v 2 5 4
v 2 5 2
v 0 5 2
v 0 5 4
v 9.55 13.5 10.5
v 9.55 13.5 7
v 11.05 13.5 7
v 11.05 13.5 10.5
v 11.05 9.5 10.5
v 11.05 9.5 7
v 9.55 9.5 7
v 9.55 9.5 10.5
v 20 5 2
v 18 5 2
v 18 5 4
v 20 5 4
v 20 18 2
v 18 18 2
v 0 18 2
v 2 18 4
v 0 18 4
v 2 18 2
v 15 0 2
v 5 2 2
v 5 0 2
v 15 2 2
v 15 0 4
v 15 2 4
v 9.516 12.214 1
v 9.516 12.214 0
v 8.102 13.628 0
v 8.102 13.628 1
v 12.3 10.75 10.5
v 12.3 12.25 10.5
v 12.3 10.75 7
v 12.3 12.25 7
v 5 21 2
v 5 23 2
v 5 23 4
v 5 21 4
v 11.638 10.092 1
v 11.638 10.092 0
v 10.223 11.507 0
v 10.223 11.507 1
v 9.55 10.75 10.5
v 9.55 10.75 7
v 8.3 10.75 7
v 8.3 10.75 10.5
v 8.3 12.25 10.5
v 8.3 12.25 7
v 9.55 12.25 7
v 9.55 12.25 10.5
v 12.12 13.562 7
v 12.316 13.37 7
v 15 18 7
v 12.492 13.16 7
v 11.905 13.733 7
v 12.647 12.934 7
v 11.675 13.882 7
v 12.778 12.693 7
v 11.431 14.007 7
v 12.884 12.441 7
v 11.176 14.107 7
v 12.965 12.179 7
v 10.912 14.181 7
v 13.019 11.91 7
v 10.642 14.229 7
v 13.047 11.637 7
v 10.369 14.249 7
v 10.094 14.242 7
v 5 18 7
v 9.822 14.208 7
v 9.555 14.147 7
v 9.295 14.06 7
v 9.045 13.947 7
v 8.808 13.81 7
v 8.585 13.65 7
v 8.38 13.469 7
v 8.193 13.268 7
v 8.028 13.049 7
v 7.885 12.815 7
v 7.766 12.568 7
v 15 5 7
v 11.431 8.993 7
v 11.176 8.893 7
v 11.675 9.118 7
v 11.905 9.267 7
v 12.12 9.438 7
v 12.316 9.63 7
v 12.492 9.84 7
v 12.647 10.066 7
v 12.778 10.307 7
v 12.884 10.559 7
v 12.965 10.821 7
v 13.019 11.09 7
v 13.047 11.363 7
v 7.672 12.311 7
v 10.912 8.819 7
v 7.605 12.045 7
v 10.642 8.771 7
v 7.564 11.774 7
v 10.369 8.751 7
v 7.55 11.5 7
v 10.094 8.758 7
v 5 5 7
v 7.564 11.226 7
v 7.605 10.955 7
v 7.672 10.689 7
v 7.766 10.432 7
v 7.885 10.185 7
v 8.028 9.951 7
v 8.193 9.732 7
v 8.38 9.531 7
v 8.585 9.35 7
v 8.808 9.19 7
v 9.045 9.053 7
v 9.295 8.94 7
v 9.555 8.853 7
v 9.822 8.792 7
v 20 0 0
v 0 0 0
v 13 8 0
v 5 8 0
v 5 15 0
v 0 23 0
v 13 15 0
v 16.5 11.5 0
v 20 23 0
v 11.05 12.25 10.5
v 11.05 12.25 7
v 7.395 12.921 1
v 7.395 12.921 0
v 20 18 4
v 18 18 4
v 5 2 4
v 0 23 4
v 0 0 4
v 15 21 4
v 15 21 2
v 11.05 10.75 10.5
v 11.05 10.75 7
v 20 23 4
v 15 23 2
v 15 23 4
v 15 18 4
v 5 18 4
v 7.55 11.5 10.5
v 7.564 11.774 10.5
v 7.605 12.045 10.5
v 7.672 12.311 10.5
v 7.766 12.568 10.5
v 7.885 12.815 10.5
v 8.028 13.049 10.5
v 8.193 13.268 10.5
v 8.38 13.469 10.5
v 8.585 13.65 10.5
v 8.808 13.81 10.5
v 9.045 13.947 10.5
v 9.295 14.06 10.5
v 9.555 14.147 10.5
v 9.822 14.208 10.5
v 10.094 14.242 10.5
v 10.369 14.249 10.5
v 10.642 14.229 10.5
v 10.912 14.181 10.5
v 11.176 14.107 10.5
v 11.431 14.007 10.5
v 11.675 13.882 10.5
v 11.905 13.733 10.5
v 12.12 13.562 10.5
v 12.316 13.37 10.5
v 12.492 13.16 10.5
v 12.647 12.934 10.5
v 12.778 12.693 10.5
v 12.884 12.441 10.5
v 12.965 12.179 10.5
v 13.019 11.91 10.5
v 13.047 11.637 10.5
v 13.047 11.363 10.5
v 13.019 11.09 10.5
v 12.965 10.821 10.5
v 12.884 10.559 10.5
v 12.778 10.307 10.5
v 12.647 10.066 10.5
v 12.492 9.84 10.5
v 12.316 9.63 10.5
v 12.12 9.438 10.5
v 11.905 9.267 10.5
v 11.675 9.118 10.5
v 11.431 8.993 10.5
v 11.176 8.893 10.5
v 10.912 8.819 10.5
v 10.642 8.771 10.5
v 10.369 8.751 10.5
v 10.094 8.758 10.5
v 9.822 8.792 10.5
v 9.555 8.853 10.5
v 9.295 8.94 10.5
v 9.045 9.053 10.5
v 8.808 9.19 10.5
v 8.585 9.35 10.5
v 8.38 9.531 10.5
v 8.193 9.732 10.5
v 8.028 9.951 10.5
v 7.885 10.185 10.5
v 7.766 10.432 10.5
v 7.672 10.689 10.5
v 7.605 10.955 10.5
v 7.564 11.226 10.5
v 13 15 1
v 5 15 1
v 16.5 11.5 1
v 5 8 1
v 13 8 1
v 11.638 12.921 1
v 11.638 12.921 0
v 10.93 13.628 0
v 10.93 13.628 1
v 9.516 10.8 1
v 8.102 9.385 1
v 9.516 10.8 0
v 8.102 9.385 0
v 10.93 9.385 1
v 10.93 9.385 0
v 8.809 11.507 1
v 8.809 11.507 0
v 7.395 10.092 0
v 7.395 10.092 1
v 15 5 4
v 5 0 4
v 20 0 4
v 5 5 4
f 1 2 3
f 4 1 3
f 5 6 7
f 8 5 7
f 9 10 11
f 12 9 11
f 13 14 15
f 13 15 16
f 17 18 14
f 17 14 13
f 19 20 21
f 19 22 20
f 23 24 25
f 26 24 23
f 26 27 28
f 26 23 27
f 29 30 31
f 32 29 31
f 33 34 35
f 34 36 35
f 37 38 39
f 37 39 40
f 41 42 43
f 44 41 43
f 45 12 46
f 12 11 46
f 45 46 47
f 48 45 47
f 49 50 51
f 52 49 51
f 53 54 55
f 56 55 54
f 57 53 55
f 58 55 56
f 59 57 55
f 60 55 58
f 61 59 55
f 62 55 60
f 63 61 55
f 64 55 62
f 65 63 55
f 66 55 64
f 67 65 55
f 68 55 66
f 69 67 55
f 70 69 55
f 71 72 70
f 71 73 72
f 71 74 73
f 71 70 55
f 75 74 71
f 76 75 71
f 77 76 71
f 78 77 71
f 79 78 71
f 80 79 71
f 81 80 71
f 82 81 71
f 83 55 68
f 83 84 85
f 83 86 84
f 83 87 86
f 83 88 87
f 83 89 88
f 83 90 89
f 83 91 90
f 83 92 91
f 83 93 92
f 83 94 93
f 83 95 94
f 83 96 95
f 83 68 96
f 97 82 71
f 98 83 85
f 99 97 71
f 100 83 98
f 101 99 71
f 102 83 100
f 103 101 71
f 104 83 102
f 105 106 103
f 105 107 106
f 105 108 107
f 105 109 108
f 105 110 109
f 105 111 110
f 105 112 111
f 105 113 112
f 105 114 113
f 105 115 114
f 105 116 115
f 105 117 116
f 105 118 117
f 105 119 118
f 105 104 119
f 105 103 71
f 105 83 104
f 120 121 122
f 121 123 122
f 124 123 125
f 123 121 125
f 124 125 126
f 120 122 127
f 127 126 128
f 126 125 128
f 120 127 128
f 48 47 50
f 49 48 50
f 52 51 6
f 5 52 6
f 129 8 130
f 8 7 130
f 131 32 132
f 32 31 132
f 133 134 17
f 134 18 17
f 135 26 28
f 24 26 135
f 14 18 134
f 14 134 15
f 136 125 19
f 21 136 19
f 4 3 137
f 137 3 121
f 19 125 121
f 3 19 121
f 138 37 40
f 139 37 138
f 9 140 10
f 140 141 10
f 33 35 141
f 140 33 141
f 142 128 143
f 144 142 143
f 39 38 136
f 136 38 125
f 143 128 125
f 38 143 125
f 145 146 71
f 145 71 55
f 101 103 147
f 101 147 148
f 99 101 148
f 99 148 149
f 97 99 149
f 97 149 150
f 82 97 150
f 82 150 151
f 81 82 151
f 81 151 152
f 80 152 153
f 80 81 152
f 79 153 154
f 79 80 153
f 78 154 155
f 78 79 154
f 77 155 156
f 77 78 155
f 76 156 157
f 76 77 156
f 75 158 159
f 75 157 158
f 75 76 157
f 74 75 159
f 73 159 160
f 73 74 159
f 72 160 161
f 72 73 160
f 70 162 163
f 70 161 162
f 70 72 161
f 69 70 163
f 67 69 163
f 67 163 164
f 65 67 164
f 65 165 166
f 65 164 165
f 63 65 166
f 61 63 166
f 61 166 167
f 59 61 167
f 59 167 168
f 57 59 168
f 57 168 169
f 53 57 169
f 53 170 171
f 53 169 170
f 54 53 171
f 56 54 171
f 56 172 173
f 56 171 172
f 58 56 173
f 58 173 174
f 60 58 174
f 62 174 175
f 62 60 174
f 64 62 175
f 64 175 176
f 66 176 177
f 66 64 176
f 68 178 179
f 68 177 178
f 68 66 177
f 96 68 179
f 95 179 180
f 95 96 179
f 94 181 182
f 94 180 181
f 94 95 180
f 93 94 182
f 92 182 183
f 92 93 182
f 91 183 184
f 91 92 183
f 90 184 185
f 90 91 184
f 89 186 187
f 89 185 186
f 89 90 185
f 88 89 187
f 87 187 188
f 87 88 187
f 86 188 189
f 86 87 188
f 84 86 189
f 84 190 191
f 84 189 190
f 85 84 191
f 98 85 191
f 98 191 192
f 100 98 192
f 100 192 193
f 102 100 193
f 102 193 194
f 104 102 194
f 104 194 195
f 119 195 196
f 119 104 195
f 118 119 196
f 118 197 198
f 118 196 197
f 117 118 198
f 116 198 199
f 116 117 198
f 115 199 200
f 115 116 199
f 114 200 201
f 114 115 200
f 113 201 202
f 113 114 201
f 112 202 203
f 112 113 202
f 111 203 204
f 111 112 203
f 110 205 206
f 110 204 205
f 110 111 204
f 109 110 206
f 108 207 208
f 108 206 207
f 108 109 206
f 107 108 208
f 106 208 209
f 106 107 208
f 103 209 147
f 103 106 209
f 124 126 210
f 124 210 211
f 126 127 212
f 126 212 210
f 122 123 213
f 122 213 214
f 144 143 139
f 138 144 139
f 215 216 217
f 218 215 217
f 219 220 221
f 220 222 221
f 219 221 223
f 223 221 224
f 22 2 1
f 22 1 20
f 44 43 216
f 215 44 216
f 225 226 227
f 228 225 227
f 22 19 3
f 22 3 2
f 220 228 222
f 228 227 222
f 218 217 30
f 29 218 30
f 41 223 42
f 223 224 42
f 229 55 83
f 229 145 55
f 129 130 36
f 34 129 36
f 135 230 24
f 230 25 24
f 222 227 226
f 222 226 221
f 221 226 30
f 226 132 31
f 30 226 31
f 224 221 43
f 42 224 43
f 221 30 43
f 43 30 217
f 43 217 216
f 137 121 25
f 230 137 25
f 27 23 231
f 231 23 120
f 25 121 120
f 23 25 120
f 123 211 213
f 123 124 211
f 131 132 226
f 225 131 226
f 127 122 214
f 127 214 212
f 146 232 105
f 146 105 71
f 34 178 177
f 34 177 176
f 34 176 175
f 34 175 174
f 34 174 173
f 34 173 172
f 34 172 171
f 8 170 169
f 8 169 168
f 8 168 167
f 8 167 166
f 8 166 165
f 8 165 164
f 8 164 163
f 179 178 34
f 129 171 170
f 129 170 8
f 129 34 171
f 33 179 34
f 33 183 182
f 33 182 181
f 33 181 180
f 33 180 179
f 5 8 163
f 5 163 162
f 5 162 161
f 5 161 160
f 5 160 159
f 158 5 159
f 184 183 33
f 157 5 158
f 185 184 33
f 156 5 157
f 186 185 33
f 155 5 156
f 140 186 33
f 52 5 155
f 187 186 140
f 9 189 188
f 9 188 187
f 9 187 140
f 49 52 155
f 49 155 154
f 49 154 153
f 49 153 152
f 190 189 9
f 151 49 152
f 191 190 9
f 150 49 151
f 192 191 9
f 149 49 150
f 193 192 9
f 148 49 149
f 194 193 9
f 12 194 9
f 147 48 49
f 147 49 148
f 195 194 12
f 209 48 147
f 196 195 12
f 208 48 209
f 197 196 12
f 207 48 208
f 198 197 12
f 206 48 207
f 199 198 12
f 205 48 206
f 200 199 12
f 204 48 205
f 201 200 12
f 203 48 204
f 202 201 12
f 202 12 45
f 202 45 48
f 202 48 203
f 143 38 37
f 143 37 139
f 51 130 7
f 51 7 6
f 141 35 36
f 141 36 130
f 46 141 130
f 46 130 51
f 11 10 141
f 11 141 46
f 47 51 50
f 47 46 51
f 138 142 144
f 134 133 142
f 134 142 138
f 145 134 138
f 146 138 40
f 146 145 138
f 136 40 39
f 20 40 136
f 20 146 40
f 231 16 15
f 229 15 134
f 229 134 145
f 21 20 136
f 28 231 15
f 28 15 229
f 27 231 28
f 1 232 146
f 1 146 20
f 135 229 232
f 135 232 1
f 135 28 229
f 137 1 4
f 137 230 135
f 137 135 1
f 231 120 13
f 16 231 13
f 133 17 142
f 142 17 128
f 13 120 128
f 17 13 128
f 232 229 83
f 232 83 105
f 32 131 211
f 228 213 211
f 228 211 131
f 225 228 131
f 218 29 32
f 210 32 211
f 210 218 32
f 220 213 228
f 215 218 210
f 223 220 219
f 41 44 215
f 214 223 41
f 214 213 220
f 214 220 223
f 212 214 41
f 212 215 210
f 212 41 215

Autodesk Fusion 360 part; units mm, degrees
sketch "スケッチ1" plane through (0, 0, 0) normal (0, 0, 1) x (1, 0, 0)
  line L0 (0, 0) -> (20, 0)
  line L1 (20, 0) -> (20, 23)
  line L2 (20, 23) -> (0, 23)
  line L3 (0, 23) -> (0, 0)
  dimension "d1" = 20
  dimension "d2" = 23
extrude "押し出し1" add sketch "スケッチ1" along normal blind 2
sketch "スケッチ2" plane through (0, 0, 2) normal (0, 0, 1) x (-1, 0, 0)
  line L0 (0, -23) -> (0, 0)
  line L1 (0, 0) -> (-20, 0)
  line L2 (-20, 0) -> (-20, -23)
  line L3 (-20, -23) -> (0, -23)
  line L4 (0, -23) -> (-5, -23)
  line L5 (-5, -23) -> (-5, -18)
  line L6 (-5, -18) -> (0, -18)
  line L7 (0, -18) -> (0, -23)
  line L8 (-20, -23) -> (-15, -23)
  line L9 (-15, -23) -> (-15, -18)
  line L10 (-15, -18) -> (-20, -18)
  line L11 (-20, -18) -> (-20, -23)
  line L12 (0, 0) -> (-5, 0)
  line L13 (-5, 0) -> (-5, -5)
  line L14 (-5, -5) -> (0, -5)
  line L15 (0, -5) -> (0, 0)
  line L16 (-20, 0) -> (-15, 0)
  line L17 (-15, 0) -> (-15, -5)
  line L18 (-15, -5) -> (-20, -5)
  line L19 (-20, -5) -> (-20, 0)
  line L20 (-2, -21) -> (-18, -21)
  line L21 (-18, -21) -> (-18, -2)
  line L22 (-18, -2) -> (-2, -2)
  line L23 (-2, -2) -> (-2, -21)
  dimension "d5" = 5
  dimension "d6" = 5
  dimension "d7" = 5
  dimension "d8" = 5
  dimension "d9" = 5
  dimension "d10" = 5
  dimension "d11" = 5
  dimension "d12" = 5
extrude "押し出し2" add sketch "スケッチ2" along normal blind 2 contours L0 L3 L4 L5 L6 L7 L20 L23 | L0 L1 L12 L13 L14 L15 L22 L23 | L5 L6 L20 L23 | L5 L6 L9 L10 L13 L14 L17 L18 L20 L21 L22 L23 | L2 L3 L8 L9 L10 L11 L20 L21 | L13 L14 L22 L23 | L9 L10 L20 L21 | L1 L2 L16 L17 L18 L19 L21 L22 | L17 L18 L21 L22
sketch "スケッチ3" plane through (0, 0, 4) normal (0, 0, 1) x (-1, 0, 0)
  line L0 (-18, -18) -> (-20, -18)
  line L1 (-20, -18) -> (-20, -23)
  line L2 (-20, -23) -> (-15, -23)
  line L3 (-15, -23) -> (-15, -21)
  line L4 (-15, -21) -> (-5, -21)
  line L5 (-5, -21) -> (-5, -23)
  line L6 (-5, -23) -> (0, -23)
  line L7 (0, -23) -> (0, -18)
  line L8 (0, -18) -> (-2, -18)
  line L9 (-2, -18) -> (-2, -5)
  line L10 (-2, -5) -> (0, -5)
  line L11 (0, -5) -> (0, 0)
  line L12 (0, 0) -> (-5, 0)
  line L13 (-5, 0) -> (-5, -2)
  line L14 (-5, -2) -> (-15, -2)
  line L15 (-15, -2) -> (-15, 0)
  line L16 (-15, 0) -> (-20, 0)
  line L17 (-20, 0) -> (-20, -5)
  line L18 (-20, -5) -> (-18, -5)
  line L19 (-18, -5) -> (-18, -18)
  line L20 (-5, -18) -> (-15, -18)
  line L21 (-15, -18) -> (-15, -5)
  line L22 (-15, -5) -> (-5, -5)
  line L23 (-5, -5) -> (-5, -18)
extrude "押し出し3" add sketch "スケッチ3" along normal blind 3 contours L20 L21 L22 L23
sketch "スケッチ4" plane through (0, 0, 7) normal (0, 0, 1) x (-1, 0, 0)
  line L0 (-5, -5) -> (-15, -5)
  line L1 (-15, -5) -> (-15, -18)
  line L2 (-15, -18) -> (-5, -18)
  line L3 (-5, -18) -> (-5, -5)
  line L4 (-9.55, -13.5) -> (-11.05, -13.5)
  line L5 (-11.05, -13.5) -> (-11.05, -9.5)
  line L6 (-11.05, -9.5) -> (-9.55, -9.5)
  line L7 (-9.55, -9.5) -> (-9.55, -13.5)
  line L8 (-8.3, -12.25) -> (-12.3, -12.25)
  line L9 (-12.3, -12.25) -> (-12.3, -10.75)
  line L10 (-12.3, -10.75) -> (-8.3, -10.75)
  line L11 (-8.3, -10.75) -> (-8.3, -12.25)
  circle A0 centre (-10.3, -11.5) radius 2.75
  dimension "d17" = 13
  dimension "d18" = 1.5
  dimension "d19" = 4
  dimension "d20" = 4
  dimension "d21" = 1.5
  dimension "d22" = 5.5
extrude "押し出し4" add sketch "スケッチ4" along normal blind 3.5 contours A0
sketch "スケッチ5" plane through (0, 0, 0) normal (0, 0, -1) x (1, 0, 0)
  line L0 (0, 0) -> (0, -23)
  line L1 (0, -23) -> (20, -23)
  line L2 (20, -23) -> (20, 0)
  line L3 (20, 0) -> (0, 0)
  line L4 (16.5, -11.5) -> (13, -15)
  line L5 (13, -8) -> (16.5, -11.5)
  line L6 (13, -15) -> (5, -15)
  line L7 (5, -15) -> (5, -8)
  line L8 (5, -8) -> (13, -8)
  line L9 (7.3948, -12.9209) -> (10.9304, -9.3854)
  line L10 (11.6375, -10.0925) -> (8.102, -13.628)
  line L11 (8.102, -13.628) -> (7.3948, -12.9209)
  line L12 (10.9304, -9.3854) -> (11.6375, -10.0925)
  line L13 (7.3948, -10.0925) -> (8.102, -9.3854)
  line L14 (11.6375, -12.9209) -> (10.9304, -13.628)
  line L15 (10.9304, -13.628) -> (7.3948, -10.0925)
  line L16 (8.102, -9.3854) -> (11.6375, -12.9209)
extrude "押し出し5" cut sketch "スケッチ5" against normal blind 1 contours L4 L5 L6 L7 L8
